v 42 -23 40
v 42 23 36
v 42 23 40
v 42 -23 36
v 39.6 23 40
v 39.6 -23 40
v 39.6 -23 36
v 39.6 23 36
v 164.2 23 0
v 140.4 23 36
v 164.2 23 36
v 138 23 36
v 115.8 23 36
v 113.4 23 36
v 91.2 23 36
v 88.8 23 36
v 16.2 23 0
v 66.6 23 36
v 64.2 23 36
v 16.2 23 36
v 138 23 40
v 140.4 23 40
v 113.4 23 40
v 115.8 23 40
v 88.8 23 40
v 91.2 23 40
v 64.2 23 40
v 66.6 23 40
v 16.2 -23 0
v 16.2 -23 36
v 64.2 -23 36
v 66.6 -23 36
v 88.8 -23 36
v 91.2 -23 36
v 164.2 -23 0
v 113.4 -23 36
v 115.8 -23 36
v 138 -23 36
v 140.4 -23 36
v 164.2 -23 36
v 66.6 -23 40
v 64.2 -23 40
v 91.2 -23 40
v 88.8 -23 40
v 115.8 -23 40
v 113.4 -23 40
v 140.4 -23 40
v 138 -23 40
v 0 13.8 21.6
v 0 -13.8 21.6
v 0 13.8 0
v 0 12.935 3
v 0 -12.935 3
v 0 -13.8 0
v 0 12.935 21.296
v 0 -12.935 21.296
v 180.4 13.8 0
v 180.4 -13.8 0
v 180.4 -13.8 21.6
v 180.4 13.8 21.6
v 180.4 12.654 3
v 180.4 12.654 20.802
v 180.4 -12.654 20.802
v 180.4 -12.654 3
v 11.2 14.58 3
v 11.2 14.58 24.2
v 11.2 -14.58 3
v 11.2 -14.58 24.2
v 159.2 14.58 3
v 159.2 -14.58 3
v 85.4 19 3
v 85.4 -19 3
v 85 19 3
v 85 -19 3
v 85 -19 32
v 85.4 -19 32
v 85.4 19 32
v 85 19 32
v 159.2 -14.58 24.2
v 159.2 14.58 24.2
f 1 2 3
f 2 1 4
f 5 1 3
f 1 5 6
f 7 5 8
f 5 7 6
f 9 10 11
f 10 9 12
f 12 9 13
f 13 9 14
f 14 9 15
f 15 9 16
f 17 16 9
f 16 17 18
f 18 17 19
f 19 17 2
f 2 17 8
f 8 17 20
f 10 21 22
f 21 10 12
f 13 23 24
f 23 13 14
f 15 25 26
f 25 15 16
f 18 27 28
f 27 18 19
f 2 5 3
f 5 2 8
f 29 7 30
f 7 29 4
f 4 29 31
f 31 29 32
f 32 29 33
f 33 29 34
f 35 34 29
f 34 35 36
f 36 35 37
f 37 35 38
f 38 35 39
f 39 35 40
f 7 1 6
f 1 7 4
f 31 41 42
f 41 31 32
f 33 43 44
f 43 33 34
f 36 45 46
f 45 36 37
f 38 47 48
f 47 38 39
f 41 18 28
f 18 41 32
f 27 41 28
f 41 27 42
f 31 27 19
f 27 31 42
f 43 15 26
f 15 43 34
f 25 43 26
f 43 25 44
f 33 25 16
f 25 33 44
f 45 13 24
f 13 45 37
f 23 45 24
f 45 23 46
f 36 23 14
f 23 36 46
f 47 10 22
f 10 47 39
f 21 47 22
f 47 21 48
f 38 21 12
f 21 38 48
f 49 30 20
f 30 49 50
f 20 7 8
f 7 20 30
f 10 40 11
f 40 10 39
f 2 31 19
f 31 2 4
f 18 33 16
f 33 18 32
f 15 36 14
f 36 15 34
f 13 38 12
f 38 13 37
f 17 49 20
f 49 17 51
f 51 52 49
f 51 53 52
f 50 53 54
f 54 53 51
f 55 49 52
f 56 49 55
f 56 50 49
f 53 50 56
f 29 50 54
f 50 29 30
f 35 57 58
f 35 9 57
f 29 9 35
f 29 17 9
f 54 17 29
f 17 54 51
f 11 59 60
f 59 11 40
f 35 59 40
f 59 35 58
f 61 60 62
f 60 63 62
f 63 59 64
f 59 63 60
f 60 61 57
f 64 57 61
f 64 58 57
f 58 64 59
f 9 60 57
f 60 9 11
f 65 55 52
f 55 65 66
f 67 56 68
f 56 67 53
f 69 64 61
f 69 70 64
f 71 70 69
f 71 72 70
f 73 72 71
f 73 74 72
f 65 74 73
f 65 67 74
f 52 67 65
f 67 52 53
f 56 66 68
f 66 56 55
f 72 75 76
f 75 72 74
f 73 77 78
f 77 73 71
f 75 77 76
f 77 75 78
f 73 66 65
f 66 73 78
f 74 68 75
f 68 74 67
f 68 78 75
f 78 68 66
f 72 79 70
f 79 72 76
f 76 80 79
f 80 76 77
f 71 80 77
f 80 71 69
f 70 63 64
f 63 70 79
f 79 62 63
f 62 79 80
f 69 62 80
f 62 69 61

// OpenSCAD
$fn = 32;

// ----------------------------------------------------------------------
// Faired channel: 180 x 46 x 36 mm, 4 mm walls, faired ends
// ----------------------------------------------------------------------

// --- parameters (mm) ---
length = 180;             // channel length
width = 46;               // channel width at mid length
height = 36;              // channel height at mid length
wall = 4;                 // side wall thickness
floor_t = 3;              // floor thickness
end_w = 27.6;             // faired end width
end_h = 21.6;             // faired end height
ribs = 5;                 // stiffening ribs on the top
rib_t = 2.4;              // rib thickness
rib_h = 4;                // rib height

difference() {
  union() {
    hull() {
      translate([0, -13.8, 0]) cube([0.4, 27.6, 21.6]);
      translate([16.2, -23, 0]) cube([0.4, 46, 36]);
    }
    hull() {
      translate([16.2, -23, 0]) cube([0.4, 46, 36]);
      translate([90, -23, 0]) cube([0.4, 46, 36]);
    }
    hull() {
      translate([90, -23, 0]) cube([0.4, 46, 36]);
      translate([163.8, -23, 0]) cube([0.4, 46, 36]);
    }
    hull() {
      translate([163.8, -23, 0]) cube([0.4, 46, 36]);
      translate([180, -13.8, 0]) cube([0.4, 27.6, 21.6]);
    }
    /* stiffening ribs across the flat top, sunk 0.8 mm into it */
    for (i = [1 : ribs]) {
      translate([16.2 + i * (length - 2 * 16.2) / (ribs + 1) - rib_t / 2, -width / 2, height - 0.8]) cube([rib_t, width, rib_h + 0.8]);
    }
  }
  /* cavity, 5 mm proud of both ends so the ports are cut clean */
  hull() {
    translate([-5, -12.2, 3]) cube([0.4, 24.4, 17]);
    translate([11.2, -14.58, 3]) cube([0.4, 29.16, 21.2]);
  }
  hull() {
    translate([11.2, -14.58, 3]) cube([0.4, 29.16, 21.2]);
    translate([85, -19, 3]) cube([0.4, 38, 29]);
  }
  hull() {
    translate([85, -19, 3]) cube([0.4, 38, 29]);
    translate([158.8, -14.58, 3]) cube([0.4, 29.16, 21.2]);
  }
  hull() {
    translate([158.8, -14.58, 3]) cube([0.4, 29.16, 21.2]);
    translate([185, -12.2, 3]) cube([0.4, 24.4, 17]);
  }
}
